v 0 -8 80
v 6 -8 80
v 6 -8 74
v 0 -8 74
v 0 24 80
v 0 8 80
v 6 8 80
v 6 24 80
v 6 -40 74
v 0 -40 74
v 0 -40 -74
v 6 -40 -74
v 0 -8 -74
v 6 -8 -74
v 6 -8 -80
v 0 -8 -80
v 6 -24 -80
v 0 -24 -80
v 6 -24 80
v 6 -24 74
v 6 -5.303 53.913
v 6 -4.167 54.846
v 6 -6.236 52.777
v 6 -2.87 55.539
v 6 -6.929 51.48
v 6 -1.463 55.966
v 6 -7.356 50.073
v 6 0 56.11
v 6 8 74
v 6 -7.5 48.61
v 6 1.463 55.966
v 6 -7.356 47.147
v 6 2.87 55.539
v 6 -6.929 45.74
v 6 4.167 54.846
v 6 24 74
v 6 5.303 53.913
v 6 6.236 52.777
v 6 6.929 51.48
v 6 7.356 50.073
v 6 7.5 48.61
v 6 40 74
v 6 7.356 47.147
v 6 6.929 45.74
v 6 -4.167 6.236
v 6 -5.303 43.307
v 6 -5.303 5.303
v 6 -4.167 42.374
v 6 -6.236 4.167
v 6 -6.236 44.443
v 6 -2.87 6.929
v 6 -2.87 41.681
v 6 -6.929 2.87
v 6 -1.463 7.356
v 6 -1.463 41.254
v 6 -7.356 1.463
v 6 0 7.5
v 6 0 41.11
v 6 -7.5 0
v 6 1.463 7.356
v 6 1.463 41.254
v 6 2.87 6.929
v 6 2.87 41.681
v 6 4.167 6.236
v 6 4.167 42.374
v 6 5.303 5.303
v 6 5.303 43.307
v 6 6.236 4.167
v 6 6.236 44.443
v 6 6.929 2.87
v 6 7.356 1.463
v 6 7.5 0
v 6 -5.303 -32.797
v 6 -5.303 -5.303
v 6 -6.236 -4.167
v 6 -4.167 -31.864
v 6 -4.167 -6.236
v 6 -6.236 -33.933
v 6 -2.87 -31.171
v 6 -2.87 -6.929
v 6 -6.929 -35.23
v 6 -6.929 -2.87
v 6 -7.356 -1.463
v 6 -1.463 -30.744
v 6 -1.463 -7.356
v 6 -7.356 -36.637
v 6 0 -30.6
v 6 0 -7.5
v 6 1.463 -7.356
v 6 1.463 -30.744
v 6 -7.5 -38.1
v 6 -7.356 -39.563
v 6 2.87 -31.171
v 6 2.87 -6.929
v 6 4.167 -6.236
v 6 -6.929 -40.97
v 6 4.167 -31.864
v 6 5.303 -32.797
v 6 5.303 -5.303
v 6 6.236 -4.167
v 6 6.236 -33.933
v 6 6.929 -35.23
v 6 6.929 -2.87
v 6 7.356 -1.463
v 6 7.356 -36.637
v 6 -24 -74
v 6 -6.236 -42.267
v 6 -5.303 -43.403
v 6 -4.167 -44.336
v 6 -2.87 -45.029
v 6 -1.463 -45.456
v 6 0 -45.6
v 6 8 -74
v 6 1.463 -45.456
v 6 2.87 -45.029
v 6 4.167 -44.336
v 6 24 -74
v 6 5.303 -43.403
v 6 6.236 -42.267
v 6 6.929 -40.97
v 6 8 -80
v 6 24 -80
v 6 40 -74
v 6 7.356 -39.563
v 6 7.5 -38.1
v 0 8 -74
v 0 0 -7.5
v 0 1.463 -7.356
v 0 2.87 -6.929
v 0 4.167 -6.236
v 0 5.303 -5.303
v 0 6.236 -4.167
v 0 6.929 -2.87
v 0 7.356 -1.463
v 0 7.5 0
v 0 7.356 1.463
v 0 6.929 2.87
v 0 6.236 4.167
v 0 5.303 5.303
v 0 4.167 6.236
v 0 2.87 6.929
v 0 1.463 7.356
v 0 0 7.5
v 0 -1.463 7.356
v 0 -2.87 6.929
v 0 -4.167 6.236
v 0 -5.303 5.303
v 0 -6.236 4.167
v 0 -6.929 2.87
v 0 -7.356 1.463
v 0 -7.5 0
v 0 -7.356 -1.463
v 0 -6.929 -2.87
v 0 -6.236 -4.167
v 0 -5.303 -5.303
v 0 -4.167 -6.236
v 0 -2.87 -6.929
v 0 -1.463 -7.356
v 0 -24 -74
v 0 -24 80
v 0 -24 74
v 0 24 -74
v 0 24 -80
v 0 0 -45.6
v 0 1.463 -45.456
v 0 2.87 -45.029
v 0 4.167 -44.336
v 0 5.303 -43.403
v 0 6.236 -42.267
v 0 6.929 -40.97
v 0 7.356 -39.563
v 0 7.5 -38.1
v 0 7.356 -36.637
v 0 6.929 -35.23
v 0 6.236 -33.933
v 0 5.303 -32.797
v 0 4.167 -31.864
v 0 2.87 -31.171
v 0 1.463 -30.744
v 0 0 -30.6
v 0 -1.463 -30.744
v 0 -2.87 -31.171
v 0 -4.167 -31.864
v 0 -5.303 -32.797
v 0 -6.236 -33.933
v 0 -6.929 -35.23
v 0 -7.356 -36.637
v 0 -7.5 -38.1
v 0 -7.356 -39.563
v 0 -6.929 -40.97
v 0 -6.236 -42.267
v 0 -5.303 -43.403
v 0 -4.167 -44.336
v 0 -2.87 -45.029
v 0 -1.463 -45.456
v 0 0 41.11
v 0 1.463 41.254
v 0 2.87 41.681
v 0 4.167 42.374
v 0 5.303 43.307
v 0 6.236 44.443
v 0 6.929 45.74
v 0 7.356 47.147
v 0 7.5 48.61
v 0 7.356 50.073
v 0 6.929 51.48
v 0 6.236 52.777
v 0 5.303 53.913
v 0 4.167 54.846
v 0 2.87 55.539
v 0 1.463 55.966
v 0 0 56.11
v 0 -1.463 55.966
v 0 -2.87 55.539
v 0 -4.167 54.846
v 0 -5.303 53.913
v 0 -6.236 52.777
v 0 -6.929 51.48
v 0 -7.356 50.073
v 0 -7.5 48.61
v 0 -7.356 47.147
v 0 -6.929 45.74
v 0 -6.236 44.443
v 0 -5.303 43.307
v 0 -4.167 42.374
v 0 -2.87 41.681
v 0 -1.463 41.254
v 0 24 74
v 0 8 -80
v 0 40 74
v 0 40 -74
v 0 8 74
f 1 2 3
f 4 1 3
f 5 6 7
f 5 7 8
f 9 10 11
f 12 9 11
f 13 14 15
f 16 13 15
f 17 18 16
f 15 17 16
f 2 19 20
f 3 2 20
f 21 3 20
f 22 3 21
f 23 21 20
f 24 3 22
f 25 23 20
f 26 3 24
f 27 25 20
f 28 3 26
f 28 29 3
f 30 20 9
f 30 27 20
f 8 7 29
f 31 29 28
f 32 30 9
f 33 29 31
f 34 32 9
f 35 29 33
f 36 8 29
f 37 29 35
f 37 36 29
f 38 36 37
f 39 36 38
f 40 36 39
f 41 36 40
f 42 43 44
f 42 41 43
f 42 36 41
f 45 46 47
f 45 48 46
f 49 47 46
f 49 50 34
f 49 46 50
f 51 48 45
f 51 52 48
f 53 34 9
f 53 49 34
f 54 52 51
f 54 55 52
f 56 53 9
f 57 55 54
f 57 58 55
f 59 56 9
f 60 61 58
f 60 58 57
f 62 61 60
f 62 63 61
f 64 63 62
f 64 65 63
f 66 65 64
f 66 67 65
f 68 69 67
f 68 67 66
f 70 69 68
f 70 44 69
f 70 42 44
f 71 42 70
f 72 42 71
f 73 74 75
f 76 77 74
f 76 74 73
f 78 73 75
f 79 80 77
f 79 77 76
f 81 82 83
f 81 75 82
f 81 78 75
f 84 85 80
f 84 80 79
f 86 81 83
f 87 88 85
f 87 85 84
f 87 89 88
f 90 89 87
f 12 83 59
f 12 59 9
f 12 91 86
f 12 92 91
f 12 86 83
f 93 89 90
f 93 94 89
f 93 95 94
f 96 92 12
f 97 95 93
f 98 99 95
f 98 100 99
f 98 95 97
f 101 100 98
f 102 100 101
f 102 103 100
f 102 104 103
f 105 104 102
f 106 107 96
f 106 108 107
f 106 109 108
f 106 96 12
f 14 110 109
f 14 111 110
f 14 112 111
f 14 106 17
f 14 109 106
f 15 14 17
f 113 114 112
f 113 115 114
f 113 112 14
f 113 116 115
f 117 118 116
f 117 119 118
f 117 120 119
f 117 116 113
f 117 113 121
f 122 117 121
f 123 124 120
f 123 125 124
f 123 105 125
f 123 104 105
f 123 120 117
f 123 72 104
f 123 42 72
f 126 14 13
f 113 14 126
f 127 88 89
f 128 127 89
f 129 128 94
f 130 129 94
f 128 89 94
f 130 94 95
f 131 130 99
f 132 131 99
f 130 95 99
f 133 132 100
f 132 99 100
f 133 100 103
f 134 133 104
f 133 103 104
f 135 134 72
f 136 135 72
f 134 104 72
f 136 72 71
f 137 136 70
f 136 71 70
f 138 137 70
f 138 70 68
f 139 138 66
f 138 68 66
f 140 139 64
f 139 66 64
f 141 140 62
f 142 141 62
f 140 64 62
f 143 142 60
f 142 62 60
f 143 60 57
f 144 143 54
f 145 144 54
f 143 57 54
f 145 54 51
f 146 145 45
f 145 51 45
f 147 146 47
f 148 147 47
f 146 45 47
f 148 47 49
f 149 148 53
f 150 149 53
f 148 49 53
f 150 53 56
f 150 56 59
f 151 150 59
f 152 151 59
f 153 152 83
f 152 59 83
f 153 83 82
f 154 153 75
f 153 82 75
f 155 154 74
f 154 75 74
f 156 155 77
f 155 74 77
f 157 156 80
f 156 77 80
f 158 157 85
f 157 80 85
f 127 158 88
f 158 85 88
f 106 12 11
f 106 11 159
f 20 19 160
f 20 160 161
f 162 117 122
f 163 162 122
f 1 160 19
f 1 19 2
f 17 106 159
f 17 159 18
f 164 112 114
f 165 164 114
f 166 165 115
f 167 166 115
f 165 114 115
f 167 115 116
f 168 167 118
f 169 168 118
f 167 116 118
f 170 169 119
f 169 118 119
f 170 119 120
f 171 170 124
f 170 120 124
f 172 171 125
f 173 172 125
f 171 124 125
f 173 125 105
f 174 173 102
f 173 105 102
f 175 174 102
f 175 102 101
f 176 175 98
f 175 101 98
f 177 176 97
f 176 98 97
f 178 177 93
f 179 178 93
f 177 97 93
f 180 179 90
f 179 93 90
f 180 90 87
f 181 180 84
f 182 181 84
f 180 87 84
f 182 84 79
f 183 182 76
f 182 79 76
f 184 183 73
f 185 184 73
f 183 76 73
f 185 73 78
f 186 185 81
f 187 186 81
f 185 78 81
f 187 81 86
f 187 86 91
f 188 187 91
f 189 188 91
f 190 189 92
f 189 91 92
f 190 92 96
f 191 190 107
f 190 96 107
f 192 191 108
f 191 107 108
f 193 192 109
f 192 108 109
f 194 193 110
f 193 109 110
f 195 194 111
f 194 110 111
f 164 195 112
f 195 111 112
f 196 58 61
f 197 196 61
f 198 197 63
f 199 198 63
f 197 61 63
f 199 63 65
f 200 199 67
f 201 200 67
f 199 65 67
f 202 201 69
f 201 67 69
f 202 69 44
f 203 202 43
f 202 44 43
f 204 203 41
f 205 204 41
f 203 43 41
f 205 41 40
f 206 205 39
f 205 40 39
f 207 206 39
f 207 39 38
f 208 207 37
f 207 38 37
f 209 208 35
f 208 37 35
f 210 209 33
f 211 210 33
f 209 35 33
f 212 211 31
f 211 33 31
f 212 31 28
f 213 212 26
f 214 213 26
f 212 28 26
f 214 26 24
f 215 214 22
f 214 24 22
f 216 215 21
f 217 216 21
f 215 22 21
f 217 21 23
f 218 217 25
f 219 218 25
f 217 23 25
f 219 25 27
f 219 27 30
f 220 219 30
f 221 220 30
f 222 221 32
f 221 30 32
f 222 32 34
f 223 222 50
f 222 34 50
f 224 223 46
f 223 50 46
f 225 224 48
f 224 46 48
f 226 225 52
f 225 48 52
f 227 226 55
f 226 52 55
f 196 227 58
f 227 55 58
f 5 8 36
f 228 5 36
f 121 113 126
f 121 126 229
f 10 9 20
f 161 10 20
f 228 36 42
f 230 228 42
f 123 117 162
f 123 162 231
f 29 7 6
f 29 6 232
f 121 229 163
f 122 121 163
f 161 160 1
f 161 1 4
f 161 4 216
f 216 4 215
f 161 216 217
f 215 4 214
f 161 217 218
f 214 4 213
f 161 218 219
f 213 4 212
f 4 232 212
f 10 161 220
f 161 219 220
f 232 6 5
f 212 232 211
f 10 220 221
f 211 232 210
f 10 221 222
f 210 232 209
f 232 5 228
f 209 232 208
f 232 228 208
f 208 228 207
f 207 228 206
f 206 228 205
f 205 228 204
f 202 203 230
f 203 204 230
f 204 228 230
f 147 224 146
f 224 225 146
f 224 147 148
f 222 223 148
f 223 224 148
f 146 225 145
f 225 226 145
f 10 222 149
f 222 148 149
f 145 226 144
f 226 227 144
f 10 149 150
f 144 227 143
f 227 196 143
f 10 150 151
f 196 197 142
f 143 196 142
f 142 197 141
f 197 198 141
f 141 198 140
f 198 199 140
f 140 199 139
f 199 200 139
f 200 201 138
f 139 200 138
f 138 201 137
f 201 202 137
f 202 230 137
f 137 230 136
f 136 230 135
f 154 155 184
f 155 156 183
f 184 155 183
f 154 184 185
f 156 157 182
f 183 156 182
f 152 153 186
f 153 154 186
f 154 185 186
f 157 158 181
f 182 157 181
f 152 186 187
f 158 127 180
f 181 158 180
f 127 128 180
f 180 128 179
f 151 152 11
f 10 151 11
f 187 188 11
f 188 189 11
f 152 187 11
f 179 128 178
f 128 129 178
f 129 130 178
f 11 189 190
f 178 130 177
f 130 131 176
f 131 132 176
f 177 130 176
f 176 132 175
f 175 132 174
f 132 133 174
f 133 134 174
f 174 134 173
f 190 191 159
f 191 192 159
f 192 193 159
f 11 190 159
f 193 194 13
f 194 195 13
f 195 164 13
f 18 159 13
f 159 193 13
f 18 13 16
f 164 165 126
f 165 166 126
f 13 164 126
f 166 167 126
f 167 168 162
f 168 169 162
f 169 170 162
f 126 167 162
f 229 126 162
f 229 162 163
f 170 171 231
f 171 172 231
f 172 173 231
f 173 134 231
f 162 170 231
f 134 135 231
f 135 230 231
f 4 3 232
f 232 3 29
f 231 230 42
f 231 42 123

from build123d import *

# Parameters (mm, degrees)
CROQUIS1_W              = 160
CROQUIS1_H              = 80
SALIENTE_EXTRUIR1_DEPTH = 6
CROQUIS2_R              = 7.5
CORTAR_EXTRUIR1_DEPTH   = 6
CROQUIS3_W              = 6
CROQUIS3_H              = 16
CORTAR_EXTRUIR2_DEPTH   = 6


with BuildPart() as part:
    # Croquis1 → Saliente-Extruir1 (new body)
    with BuildSketch(Plane(origin=(0, 0, 0), x_dir=(0, 0, -1), z_dir=(1, 0, 0))):
        Rectangle(CROQUIS1_W, CROQUIS1_H)
    extrude(amount=SALIENTE_EXTRUIR1_DEPTH)

    # Croquis2 → Cortar-Extruir1 (cut)
    with BuildSketch(Plane(origin=(6, 0, 0), x_dir=(0, 0, -1), z_dir=(1, 0, 0))):
        with Locations((-48.61, 0)):
            Circle(CROQUIS2_R)
        Circle(CROQUIS2_R)
        with Locations((38.1, 0)):
            Circle(CROQUIS2_R)
    extrude(amount=-CORTAR_EXTRUIR1_DEPTH, mode=Mode.SUBTRACT)

    # Croquis3 → Cortar-Extruir2 (cut)
    with BuildSketch(Plane(origin=(6, 0, 0), x_dir=(0, 0, -1), z_dir=(1, 0, 0))):
        with Locations((-77, 32)):
            Rectangle(CROQUIS3_W, CROQUIS3_H)
        with Locations((-77, -32)):
            Rectangle(CROQUIS3_W, CROQUIS3_H)
        with Locations((77, -32)):
            Rectangle(CROQUIS3_W, CROQUIS3_H)
        with Locations((77, 32)):
            Rectangle(CROQUIS3_W, CROQUIS3_H)
        with Locations((77, 0)):
            Rectangle(CROQUIS3_W, CROQUIS3_H)
        with Locations((-77, 0)):
            Rectangle(CROQUIS3_W, CROQUIS3_H)
    extrude(amount=-CORTAR_EXTRUIR2_DEPTH, mode=Mode.SUBTRACT)


solid = part.part
